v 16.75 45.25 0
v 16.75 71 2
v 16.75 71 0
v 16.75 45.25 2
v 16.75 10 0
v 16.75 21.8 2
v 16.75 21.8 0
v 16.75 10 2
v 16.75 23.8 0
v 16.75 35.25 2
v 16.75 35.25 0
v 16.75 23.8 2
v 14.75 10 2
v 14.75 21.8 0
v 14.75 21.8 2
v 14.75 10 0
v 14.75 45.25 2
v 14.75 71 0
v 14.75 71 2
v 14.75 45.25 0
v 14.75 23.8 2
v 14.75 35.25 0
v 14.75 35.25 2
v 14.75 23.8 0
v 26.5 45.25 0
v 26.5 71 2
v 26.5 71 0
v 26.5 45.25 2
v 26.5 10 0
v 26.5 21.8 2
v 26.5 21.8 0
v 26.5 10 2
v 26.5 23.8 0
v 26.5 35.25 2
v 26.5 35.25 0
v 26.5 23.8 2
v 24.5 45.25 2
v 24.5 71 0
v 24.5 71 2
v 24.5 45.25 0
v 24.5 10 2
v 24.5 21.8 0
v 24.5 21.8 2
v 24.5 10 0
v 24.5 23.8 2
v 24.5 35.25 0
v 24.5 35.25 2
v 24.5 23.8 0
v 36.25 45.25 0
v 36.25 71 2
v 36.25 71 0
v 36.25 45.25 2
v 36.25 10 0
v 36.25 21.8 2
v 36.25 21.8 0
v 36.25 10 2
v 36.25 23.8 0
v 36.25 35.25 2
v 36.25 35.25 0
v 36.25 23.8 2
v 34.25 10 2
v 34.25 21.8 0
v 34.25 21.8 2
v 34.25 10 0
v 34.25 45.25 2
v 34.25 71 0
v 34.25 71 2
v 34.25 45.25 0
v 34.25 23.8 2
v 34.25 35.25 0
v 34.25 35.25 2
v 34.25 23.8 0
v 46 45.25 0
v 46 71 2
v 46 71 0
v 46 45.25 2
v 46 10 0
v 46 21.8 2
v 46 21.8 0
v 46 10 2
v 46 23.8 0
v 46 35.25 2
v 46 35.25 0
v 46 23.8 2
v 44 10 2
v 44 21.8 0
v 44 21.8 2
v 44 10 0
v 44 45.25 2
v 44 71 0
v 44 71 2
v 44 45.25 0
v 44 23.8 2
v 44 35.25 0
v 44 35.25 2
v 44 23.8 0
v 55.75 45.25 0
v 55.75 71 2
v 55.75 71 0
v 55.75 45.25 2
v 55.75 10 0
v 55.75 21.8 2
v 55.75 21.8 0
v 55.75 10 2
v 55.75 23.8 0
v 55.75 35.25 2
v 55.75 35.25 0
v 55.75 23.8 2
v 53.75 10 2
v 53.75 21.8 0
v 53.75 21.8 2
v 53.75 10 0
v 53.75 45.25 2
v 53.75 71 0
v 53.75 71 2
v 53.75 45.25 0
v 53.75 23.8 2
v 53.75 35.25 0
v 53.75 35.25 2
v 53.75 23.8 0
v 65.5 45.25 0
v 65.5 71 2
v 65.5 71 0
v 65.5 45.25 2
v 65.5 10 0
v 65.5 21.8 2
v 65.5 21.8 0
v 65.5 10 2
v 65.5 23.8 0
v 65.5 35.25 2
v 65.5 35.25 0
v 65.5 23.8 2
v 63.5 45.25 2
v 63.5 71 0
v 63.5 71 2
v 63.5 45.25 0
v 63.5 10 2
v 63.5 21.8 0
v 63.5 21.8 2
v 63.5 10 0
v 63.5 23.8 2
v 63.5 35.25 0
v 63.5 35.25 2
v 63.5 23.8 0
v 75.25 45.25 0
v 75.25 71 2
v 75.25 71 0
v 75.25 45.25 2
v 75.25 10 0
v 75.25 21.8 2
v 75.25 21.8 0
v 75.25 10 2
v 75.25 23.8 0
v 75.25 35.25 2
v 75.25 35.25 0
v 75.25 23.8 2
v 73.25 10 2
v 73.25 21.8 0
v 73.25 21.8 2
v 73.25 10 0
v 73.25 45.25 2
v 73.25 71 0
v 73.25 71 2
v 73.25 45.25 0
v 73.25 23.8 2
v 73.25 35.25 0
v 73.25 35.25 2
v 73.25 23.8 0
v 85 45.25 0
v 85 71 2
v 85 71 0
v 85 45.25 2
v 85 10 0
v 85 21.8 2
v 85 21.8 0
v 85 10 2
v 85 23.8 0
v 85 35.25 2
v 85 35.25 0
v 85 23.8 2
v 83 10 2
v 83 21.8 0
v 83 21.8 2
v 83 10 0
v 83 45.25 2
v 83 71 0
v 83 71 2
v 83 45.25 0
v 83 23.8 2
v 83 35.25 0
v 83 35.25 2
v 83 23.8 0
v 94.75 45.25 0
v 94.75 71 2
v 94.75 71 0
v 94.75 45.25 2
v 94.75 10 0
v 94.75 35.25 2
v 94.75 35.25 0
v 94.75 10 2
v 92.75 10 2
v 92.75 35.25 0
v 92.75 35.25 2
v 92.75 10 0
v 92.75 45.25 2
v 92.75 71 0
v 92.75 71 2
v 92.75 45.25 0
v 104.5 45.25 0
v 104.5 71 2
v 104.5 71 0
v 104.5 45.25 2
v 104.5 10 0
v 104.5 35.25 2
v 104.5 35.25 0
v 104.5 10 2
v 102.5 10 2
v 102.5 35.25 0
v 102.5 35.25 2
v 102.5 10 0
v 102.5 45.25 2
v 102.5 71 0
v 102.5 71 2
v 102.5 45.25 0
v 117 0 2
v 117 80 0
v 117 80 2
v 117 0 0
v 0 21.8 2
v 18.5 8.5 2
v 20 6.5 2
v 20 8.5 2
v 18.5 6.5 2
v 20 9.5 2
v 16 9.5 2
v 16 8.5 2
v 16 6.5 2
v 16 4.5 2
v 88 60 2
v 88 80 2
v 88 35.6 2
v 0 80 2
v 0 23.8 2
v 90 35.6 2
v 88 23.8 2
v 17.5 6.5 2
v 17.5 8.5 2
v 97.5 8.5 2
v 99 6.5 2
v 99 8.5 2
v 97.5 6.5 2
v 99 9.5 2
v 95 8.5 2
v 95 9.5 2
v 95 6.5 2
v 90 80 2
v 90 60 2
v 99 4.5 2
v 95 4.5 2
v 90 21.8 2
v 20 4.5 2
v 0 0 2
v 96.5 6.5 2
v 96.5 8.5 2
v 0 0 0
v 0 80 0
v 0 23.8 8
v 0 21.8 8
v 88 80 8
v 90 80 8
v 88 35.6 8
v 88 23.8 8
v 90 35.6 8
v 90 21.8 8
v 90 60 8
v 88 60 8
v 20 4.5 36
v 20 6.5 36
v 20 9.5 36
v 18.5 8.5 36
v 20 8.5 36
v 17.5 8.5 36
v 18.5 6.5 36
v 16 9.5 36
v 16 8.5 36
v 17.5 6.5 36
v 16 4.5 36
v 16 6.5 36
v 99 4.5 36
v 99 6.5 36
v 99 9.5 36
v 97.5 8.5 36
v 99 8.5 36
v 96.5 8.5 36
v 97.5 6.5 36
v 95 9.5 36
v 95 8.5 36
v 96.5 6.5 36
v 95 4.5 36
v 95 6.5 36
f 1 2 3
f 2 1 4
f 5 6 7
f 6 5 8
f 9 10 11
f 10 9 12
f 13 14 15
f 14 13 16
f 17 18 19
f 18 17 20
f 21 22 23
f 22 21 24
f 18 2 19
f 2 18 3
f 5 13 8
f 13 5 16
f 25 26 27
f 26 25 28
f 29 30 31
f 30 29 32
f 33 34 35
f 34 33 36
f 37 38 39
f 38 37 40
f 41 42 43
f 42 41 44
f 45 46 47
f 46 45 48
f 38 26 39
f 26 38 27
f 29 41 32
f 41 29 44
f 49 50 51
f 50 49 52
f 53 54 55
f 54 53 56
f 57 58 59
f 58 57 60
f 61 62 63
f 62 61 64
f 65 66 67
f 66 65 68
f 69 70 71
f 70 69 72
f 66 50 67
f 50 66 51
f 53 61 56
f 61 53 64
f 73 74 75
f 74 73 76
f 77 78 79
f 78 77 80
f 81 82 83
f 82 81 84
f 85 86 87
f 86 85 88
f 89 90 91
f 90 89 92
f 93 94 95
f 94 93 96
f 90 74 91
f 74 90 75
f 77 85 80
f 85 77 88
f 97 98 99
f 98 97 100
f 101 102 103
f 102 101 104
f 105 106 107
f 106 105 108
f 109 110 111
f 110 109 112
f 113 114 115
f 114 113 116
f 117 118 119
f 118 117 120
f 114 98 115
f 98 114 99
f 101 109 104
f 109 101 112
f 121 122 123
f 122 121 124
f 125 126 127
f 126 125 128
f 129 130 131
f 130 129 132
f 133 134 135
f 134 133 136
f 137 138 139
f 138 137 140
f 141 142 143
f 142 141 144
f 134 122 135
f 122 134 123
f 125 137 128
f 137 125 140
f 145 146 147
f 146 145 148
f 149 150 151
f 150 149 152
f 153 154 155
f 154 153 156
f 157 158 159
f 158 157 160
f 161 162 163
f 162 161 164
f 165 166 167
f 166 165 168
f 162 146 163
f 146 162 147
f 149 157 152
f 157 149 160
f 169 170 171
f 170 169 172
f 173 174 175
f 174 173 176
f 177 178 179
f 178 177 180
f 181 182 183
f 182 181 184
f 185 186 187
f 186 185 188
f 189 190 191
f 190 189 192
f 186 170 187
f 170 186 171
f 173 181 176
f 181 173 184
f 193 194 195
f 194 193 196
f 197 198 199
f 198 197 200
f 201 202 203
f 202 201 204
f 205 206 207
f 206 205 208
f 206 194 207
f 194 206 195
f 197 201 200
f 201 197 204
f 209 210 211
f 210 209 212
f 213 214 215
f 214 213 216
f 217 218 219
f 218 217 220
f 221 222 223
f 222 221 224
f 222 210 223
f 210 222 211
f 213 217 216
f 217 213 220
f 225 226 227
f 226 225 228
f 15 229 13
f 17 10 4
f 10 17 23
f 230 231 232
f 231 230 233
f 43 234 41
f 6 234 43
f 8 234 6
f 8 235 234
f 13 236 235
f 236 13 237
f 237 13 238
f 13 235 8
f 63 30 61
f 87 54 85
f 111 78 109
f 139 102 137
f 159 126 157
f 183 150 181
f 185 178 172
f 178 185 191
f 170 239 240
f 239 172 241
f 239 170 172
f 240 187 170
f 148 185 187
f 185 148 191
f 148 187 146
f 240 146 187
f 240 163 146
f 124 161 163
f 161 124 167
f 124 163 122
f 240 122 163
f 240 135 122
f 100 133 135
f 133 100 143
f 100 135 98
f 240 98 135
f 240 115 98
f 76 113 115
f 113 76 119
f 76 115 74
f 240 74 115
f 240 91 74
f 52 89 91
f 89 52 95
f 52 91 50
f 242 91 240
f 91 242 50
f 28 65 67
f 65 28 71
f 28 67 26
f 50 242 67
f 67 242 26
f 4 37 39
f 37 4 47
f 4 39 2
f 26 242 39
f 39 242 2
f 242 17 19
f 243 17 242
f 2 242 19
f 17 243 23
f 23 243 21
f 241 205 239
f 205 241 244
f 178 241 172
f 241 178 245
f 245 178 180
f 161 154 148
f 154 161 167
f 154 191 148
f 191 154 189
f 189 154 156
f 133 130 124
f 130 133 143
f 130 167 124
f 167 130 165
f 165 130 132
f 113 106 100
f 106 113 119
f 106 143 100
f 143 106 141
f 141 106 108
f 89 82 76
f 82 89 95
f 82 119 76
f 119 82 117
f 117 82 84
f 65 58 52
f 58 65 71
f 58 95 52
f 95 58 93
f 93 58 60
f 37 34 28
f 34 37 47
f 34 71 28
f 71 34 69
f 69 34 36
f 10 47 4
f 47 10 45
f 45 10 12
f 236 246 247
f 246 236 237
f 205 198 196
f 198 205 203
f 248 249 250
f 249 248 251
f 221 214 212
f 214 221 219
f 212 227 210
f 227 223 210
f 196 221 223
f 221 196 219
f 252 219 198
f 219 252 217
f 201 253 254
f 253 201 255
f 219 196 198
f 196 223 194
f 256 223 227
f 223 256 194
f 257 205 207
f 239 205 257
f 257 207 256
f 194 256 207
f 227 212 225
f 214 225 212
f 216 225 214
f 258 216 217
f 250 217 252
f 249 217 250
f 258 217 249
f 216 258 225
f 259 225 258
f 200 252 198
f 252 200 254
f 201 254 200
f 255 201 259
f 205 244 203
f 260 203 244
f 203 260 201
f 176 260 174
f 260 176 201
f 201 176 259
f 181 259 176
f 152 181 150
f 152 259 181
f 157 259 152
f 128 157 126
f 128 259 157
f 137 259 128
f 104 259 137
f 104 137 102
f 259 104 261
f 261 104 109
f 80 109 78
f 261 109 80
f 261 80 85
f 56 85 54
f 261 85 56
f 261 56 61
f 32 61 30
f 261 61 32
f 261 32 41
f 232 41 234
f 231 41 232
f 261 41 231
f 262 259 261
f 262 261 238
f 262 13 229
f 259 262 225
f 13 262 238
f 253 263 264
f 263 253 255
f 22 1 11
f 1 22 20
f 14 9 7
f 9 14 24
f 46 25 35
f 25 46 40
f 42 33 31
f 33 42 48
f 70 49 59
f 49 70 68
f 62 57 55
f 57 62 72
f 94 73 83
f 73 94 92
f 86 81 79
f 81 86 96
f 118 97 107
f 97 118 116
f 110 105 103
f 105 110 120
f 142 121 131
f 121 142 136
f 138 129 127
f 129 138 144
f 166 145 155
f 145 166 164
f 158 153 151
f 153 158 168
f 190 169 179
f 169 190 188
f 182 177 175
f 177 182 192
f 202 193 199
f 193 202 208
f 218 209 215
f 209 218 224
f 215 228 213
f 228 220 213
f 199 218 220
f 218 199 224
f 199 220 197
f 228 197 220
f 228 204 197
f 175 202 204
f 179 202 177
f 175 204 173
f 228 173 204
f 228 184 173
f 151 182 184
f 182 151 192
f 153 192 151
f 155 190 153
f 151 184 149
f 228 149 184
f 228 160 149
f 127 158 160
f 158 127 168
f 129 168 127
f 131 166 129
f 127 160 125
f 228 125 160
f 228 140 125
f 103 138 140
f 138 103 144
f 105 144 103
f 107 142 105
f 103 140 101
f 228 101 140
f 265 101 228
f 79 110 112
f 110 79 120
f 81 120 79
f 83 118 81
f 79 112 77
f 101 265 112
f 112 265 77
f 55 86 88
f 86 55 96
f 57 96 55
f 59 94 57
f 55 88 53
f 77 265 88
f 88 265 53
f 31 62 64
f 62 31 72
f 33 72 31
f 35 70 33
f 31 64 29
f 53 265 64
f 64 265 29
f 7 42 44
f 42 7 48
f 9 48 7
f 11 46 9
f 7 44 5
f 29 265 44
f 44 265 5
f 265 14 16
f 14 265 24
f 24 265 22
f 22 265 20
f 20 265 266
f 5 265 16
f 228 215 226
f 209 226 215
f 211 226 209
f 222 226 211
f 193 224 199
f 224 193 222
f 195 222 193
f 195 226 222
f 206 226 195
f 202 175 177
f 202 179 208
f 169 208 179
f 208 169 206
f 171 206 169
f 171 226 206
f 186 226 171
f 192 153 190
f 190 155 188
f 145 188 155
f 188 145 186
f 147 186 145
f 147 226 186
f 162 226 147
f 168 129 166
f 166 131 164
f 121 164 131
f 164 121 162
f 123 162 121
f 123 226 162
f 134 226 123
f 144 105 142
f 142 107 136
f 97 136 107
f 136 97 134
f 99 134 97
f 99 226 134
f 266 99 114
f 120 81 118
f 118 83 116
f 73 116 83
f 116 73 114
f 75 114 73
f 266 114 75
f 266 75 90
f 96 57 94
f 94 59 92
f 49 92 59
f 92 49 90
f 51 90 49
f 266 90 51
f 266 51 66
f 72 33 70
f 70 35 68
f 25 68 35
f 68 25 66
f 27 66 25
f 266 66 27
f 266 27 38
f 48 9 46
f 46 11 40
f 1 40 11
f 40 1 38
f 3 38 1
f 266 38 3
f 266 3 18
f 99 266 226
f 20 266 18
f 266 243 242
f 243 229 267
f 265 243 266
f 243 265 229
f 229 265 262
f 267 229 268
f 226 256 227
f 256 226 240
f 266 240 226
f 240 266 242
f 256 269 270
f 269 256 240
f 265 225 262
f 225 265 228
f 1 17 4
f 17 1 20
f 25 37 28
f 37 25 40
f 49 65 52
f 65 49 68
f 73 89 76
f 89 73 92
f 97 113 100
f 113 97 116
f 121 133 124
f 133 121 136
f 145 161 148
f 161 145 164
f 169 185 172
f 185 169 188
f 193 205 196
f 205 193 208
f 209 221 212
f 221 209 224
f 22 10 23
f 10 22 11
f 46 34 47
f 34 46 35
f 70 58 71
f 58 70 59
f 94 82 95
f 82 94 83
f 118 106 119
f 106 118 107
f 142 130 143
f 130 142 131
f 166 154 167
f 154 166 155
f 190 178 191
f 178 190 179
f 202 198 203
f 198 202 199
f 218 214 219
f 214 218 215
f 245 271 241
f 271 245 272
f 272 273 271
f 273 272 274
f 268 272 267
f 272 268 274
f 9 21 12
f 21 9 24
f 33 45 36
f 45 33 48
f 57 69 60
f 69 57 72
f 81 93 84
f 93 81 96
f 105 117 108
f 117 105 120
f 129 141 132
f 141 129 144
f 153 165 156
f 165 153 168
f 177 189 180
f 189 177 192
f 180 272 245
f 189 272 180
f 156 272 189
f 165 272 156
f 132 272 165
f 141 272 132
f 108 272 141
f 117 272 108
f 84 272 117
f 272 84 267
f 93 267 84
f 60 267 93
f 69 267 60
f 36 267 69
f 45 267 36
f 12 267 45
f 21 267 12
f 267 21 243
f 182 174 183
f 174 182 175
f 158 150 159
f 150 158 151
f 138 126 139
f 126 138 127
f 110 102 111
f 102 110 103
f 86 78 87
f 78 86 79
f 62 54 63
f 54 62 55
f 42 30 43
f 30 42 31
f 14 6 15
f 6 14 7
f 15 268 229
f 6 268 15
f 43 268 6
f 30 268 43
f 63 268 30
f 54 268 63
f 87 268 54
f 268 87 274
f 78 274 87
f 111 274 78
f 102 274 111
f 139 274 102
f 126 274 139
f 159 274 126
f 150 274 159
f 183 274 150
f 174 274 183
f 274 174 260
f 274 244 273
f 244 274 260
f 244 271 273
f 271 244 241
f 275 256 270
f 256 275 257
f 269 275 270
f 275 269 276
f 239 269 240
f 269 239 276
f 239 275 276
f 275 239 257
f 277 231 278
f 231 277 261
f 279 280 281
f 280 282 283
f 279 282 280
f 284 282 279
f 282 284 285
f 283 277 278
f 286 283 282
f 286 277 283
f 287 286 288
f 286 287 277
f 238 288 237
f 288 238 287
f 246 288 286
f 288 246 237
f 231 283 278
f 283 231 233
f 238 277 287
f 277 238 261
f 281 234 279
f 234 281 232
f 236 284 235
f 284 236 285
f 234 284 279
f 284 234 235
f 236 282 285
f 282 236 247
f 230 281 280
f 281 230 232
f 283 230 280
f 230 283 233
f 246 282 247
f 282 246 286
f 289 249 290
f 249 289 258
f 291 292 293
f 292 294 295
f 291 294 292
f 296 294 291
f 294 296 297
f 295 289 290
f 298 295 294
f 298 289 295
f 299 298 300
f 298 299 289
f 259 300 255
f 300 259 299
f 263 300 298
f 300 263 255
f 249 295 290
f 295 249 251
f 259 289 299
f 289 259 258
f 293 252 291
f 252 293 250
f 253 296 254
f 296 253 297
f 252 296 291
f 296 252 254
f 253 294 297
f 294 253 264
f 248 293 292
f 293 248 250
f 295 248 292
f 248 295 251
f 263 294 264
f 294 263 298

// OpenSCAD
//number of fragments
$fn=28;

difference() {
    // base
    cube([117,80,2]);

    // air vents
    for(i=[1:10]){
        translate([5+(i*9.75),10,-1]){
            cube([2,61,4]);
        }
    }
}

// center spine
translate([0,35.25,0]){
    cube([108.50,10,2]);
}

// side wall
translate([0,21.8,0]){
    cube([88,2,8]);
}

// back wall left
translate([88,21.8,0]){
    cube([2,13.8,8]);
}

// back wall right
translate([88,60,0]){
    cube([2,20,8]);
}

//oled left
translate([16,4.5,0]){
    cube([4,2,36]);
}

translate([16,8.5,0]){
    cube([4,1,36]);
}

translate([17.5,6.5,0]){
    cube([1,2,36]);
}

//oled right
translate([95,4.5,0]){
    cube([4,2,36]);
}

translate([95,8.5,0]){
    cube([4,1,36]);
}

translate([96.5,6.5,0]){
    cube([1,2,36]);
}
